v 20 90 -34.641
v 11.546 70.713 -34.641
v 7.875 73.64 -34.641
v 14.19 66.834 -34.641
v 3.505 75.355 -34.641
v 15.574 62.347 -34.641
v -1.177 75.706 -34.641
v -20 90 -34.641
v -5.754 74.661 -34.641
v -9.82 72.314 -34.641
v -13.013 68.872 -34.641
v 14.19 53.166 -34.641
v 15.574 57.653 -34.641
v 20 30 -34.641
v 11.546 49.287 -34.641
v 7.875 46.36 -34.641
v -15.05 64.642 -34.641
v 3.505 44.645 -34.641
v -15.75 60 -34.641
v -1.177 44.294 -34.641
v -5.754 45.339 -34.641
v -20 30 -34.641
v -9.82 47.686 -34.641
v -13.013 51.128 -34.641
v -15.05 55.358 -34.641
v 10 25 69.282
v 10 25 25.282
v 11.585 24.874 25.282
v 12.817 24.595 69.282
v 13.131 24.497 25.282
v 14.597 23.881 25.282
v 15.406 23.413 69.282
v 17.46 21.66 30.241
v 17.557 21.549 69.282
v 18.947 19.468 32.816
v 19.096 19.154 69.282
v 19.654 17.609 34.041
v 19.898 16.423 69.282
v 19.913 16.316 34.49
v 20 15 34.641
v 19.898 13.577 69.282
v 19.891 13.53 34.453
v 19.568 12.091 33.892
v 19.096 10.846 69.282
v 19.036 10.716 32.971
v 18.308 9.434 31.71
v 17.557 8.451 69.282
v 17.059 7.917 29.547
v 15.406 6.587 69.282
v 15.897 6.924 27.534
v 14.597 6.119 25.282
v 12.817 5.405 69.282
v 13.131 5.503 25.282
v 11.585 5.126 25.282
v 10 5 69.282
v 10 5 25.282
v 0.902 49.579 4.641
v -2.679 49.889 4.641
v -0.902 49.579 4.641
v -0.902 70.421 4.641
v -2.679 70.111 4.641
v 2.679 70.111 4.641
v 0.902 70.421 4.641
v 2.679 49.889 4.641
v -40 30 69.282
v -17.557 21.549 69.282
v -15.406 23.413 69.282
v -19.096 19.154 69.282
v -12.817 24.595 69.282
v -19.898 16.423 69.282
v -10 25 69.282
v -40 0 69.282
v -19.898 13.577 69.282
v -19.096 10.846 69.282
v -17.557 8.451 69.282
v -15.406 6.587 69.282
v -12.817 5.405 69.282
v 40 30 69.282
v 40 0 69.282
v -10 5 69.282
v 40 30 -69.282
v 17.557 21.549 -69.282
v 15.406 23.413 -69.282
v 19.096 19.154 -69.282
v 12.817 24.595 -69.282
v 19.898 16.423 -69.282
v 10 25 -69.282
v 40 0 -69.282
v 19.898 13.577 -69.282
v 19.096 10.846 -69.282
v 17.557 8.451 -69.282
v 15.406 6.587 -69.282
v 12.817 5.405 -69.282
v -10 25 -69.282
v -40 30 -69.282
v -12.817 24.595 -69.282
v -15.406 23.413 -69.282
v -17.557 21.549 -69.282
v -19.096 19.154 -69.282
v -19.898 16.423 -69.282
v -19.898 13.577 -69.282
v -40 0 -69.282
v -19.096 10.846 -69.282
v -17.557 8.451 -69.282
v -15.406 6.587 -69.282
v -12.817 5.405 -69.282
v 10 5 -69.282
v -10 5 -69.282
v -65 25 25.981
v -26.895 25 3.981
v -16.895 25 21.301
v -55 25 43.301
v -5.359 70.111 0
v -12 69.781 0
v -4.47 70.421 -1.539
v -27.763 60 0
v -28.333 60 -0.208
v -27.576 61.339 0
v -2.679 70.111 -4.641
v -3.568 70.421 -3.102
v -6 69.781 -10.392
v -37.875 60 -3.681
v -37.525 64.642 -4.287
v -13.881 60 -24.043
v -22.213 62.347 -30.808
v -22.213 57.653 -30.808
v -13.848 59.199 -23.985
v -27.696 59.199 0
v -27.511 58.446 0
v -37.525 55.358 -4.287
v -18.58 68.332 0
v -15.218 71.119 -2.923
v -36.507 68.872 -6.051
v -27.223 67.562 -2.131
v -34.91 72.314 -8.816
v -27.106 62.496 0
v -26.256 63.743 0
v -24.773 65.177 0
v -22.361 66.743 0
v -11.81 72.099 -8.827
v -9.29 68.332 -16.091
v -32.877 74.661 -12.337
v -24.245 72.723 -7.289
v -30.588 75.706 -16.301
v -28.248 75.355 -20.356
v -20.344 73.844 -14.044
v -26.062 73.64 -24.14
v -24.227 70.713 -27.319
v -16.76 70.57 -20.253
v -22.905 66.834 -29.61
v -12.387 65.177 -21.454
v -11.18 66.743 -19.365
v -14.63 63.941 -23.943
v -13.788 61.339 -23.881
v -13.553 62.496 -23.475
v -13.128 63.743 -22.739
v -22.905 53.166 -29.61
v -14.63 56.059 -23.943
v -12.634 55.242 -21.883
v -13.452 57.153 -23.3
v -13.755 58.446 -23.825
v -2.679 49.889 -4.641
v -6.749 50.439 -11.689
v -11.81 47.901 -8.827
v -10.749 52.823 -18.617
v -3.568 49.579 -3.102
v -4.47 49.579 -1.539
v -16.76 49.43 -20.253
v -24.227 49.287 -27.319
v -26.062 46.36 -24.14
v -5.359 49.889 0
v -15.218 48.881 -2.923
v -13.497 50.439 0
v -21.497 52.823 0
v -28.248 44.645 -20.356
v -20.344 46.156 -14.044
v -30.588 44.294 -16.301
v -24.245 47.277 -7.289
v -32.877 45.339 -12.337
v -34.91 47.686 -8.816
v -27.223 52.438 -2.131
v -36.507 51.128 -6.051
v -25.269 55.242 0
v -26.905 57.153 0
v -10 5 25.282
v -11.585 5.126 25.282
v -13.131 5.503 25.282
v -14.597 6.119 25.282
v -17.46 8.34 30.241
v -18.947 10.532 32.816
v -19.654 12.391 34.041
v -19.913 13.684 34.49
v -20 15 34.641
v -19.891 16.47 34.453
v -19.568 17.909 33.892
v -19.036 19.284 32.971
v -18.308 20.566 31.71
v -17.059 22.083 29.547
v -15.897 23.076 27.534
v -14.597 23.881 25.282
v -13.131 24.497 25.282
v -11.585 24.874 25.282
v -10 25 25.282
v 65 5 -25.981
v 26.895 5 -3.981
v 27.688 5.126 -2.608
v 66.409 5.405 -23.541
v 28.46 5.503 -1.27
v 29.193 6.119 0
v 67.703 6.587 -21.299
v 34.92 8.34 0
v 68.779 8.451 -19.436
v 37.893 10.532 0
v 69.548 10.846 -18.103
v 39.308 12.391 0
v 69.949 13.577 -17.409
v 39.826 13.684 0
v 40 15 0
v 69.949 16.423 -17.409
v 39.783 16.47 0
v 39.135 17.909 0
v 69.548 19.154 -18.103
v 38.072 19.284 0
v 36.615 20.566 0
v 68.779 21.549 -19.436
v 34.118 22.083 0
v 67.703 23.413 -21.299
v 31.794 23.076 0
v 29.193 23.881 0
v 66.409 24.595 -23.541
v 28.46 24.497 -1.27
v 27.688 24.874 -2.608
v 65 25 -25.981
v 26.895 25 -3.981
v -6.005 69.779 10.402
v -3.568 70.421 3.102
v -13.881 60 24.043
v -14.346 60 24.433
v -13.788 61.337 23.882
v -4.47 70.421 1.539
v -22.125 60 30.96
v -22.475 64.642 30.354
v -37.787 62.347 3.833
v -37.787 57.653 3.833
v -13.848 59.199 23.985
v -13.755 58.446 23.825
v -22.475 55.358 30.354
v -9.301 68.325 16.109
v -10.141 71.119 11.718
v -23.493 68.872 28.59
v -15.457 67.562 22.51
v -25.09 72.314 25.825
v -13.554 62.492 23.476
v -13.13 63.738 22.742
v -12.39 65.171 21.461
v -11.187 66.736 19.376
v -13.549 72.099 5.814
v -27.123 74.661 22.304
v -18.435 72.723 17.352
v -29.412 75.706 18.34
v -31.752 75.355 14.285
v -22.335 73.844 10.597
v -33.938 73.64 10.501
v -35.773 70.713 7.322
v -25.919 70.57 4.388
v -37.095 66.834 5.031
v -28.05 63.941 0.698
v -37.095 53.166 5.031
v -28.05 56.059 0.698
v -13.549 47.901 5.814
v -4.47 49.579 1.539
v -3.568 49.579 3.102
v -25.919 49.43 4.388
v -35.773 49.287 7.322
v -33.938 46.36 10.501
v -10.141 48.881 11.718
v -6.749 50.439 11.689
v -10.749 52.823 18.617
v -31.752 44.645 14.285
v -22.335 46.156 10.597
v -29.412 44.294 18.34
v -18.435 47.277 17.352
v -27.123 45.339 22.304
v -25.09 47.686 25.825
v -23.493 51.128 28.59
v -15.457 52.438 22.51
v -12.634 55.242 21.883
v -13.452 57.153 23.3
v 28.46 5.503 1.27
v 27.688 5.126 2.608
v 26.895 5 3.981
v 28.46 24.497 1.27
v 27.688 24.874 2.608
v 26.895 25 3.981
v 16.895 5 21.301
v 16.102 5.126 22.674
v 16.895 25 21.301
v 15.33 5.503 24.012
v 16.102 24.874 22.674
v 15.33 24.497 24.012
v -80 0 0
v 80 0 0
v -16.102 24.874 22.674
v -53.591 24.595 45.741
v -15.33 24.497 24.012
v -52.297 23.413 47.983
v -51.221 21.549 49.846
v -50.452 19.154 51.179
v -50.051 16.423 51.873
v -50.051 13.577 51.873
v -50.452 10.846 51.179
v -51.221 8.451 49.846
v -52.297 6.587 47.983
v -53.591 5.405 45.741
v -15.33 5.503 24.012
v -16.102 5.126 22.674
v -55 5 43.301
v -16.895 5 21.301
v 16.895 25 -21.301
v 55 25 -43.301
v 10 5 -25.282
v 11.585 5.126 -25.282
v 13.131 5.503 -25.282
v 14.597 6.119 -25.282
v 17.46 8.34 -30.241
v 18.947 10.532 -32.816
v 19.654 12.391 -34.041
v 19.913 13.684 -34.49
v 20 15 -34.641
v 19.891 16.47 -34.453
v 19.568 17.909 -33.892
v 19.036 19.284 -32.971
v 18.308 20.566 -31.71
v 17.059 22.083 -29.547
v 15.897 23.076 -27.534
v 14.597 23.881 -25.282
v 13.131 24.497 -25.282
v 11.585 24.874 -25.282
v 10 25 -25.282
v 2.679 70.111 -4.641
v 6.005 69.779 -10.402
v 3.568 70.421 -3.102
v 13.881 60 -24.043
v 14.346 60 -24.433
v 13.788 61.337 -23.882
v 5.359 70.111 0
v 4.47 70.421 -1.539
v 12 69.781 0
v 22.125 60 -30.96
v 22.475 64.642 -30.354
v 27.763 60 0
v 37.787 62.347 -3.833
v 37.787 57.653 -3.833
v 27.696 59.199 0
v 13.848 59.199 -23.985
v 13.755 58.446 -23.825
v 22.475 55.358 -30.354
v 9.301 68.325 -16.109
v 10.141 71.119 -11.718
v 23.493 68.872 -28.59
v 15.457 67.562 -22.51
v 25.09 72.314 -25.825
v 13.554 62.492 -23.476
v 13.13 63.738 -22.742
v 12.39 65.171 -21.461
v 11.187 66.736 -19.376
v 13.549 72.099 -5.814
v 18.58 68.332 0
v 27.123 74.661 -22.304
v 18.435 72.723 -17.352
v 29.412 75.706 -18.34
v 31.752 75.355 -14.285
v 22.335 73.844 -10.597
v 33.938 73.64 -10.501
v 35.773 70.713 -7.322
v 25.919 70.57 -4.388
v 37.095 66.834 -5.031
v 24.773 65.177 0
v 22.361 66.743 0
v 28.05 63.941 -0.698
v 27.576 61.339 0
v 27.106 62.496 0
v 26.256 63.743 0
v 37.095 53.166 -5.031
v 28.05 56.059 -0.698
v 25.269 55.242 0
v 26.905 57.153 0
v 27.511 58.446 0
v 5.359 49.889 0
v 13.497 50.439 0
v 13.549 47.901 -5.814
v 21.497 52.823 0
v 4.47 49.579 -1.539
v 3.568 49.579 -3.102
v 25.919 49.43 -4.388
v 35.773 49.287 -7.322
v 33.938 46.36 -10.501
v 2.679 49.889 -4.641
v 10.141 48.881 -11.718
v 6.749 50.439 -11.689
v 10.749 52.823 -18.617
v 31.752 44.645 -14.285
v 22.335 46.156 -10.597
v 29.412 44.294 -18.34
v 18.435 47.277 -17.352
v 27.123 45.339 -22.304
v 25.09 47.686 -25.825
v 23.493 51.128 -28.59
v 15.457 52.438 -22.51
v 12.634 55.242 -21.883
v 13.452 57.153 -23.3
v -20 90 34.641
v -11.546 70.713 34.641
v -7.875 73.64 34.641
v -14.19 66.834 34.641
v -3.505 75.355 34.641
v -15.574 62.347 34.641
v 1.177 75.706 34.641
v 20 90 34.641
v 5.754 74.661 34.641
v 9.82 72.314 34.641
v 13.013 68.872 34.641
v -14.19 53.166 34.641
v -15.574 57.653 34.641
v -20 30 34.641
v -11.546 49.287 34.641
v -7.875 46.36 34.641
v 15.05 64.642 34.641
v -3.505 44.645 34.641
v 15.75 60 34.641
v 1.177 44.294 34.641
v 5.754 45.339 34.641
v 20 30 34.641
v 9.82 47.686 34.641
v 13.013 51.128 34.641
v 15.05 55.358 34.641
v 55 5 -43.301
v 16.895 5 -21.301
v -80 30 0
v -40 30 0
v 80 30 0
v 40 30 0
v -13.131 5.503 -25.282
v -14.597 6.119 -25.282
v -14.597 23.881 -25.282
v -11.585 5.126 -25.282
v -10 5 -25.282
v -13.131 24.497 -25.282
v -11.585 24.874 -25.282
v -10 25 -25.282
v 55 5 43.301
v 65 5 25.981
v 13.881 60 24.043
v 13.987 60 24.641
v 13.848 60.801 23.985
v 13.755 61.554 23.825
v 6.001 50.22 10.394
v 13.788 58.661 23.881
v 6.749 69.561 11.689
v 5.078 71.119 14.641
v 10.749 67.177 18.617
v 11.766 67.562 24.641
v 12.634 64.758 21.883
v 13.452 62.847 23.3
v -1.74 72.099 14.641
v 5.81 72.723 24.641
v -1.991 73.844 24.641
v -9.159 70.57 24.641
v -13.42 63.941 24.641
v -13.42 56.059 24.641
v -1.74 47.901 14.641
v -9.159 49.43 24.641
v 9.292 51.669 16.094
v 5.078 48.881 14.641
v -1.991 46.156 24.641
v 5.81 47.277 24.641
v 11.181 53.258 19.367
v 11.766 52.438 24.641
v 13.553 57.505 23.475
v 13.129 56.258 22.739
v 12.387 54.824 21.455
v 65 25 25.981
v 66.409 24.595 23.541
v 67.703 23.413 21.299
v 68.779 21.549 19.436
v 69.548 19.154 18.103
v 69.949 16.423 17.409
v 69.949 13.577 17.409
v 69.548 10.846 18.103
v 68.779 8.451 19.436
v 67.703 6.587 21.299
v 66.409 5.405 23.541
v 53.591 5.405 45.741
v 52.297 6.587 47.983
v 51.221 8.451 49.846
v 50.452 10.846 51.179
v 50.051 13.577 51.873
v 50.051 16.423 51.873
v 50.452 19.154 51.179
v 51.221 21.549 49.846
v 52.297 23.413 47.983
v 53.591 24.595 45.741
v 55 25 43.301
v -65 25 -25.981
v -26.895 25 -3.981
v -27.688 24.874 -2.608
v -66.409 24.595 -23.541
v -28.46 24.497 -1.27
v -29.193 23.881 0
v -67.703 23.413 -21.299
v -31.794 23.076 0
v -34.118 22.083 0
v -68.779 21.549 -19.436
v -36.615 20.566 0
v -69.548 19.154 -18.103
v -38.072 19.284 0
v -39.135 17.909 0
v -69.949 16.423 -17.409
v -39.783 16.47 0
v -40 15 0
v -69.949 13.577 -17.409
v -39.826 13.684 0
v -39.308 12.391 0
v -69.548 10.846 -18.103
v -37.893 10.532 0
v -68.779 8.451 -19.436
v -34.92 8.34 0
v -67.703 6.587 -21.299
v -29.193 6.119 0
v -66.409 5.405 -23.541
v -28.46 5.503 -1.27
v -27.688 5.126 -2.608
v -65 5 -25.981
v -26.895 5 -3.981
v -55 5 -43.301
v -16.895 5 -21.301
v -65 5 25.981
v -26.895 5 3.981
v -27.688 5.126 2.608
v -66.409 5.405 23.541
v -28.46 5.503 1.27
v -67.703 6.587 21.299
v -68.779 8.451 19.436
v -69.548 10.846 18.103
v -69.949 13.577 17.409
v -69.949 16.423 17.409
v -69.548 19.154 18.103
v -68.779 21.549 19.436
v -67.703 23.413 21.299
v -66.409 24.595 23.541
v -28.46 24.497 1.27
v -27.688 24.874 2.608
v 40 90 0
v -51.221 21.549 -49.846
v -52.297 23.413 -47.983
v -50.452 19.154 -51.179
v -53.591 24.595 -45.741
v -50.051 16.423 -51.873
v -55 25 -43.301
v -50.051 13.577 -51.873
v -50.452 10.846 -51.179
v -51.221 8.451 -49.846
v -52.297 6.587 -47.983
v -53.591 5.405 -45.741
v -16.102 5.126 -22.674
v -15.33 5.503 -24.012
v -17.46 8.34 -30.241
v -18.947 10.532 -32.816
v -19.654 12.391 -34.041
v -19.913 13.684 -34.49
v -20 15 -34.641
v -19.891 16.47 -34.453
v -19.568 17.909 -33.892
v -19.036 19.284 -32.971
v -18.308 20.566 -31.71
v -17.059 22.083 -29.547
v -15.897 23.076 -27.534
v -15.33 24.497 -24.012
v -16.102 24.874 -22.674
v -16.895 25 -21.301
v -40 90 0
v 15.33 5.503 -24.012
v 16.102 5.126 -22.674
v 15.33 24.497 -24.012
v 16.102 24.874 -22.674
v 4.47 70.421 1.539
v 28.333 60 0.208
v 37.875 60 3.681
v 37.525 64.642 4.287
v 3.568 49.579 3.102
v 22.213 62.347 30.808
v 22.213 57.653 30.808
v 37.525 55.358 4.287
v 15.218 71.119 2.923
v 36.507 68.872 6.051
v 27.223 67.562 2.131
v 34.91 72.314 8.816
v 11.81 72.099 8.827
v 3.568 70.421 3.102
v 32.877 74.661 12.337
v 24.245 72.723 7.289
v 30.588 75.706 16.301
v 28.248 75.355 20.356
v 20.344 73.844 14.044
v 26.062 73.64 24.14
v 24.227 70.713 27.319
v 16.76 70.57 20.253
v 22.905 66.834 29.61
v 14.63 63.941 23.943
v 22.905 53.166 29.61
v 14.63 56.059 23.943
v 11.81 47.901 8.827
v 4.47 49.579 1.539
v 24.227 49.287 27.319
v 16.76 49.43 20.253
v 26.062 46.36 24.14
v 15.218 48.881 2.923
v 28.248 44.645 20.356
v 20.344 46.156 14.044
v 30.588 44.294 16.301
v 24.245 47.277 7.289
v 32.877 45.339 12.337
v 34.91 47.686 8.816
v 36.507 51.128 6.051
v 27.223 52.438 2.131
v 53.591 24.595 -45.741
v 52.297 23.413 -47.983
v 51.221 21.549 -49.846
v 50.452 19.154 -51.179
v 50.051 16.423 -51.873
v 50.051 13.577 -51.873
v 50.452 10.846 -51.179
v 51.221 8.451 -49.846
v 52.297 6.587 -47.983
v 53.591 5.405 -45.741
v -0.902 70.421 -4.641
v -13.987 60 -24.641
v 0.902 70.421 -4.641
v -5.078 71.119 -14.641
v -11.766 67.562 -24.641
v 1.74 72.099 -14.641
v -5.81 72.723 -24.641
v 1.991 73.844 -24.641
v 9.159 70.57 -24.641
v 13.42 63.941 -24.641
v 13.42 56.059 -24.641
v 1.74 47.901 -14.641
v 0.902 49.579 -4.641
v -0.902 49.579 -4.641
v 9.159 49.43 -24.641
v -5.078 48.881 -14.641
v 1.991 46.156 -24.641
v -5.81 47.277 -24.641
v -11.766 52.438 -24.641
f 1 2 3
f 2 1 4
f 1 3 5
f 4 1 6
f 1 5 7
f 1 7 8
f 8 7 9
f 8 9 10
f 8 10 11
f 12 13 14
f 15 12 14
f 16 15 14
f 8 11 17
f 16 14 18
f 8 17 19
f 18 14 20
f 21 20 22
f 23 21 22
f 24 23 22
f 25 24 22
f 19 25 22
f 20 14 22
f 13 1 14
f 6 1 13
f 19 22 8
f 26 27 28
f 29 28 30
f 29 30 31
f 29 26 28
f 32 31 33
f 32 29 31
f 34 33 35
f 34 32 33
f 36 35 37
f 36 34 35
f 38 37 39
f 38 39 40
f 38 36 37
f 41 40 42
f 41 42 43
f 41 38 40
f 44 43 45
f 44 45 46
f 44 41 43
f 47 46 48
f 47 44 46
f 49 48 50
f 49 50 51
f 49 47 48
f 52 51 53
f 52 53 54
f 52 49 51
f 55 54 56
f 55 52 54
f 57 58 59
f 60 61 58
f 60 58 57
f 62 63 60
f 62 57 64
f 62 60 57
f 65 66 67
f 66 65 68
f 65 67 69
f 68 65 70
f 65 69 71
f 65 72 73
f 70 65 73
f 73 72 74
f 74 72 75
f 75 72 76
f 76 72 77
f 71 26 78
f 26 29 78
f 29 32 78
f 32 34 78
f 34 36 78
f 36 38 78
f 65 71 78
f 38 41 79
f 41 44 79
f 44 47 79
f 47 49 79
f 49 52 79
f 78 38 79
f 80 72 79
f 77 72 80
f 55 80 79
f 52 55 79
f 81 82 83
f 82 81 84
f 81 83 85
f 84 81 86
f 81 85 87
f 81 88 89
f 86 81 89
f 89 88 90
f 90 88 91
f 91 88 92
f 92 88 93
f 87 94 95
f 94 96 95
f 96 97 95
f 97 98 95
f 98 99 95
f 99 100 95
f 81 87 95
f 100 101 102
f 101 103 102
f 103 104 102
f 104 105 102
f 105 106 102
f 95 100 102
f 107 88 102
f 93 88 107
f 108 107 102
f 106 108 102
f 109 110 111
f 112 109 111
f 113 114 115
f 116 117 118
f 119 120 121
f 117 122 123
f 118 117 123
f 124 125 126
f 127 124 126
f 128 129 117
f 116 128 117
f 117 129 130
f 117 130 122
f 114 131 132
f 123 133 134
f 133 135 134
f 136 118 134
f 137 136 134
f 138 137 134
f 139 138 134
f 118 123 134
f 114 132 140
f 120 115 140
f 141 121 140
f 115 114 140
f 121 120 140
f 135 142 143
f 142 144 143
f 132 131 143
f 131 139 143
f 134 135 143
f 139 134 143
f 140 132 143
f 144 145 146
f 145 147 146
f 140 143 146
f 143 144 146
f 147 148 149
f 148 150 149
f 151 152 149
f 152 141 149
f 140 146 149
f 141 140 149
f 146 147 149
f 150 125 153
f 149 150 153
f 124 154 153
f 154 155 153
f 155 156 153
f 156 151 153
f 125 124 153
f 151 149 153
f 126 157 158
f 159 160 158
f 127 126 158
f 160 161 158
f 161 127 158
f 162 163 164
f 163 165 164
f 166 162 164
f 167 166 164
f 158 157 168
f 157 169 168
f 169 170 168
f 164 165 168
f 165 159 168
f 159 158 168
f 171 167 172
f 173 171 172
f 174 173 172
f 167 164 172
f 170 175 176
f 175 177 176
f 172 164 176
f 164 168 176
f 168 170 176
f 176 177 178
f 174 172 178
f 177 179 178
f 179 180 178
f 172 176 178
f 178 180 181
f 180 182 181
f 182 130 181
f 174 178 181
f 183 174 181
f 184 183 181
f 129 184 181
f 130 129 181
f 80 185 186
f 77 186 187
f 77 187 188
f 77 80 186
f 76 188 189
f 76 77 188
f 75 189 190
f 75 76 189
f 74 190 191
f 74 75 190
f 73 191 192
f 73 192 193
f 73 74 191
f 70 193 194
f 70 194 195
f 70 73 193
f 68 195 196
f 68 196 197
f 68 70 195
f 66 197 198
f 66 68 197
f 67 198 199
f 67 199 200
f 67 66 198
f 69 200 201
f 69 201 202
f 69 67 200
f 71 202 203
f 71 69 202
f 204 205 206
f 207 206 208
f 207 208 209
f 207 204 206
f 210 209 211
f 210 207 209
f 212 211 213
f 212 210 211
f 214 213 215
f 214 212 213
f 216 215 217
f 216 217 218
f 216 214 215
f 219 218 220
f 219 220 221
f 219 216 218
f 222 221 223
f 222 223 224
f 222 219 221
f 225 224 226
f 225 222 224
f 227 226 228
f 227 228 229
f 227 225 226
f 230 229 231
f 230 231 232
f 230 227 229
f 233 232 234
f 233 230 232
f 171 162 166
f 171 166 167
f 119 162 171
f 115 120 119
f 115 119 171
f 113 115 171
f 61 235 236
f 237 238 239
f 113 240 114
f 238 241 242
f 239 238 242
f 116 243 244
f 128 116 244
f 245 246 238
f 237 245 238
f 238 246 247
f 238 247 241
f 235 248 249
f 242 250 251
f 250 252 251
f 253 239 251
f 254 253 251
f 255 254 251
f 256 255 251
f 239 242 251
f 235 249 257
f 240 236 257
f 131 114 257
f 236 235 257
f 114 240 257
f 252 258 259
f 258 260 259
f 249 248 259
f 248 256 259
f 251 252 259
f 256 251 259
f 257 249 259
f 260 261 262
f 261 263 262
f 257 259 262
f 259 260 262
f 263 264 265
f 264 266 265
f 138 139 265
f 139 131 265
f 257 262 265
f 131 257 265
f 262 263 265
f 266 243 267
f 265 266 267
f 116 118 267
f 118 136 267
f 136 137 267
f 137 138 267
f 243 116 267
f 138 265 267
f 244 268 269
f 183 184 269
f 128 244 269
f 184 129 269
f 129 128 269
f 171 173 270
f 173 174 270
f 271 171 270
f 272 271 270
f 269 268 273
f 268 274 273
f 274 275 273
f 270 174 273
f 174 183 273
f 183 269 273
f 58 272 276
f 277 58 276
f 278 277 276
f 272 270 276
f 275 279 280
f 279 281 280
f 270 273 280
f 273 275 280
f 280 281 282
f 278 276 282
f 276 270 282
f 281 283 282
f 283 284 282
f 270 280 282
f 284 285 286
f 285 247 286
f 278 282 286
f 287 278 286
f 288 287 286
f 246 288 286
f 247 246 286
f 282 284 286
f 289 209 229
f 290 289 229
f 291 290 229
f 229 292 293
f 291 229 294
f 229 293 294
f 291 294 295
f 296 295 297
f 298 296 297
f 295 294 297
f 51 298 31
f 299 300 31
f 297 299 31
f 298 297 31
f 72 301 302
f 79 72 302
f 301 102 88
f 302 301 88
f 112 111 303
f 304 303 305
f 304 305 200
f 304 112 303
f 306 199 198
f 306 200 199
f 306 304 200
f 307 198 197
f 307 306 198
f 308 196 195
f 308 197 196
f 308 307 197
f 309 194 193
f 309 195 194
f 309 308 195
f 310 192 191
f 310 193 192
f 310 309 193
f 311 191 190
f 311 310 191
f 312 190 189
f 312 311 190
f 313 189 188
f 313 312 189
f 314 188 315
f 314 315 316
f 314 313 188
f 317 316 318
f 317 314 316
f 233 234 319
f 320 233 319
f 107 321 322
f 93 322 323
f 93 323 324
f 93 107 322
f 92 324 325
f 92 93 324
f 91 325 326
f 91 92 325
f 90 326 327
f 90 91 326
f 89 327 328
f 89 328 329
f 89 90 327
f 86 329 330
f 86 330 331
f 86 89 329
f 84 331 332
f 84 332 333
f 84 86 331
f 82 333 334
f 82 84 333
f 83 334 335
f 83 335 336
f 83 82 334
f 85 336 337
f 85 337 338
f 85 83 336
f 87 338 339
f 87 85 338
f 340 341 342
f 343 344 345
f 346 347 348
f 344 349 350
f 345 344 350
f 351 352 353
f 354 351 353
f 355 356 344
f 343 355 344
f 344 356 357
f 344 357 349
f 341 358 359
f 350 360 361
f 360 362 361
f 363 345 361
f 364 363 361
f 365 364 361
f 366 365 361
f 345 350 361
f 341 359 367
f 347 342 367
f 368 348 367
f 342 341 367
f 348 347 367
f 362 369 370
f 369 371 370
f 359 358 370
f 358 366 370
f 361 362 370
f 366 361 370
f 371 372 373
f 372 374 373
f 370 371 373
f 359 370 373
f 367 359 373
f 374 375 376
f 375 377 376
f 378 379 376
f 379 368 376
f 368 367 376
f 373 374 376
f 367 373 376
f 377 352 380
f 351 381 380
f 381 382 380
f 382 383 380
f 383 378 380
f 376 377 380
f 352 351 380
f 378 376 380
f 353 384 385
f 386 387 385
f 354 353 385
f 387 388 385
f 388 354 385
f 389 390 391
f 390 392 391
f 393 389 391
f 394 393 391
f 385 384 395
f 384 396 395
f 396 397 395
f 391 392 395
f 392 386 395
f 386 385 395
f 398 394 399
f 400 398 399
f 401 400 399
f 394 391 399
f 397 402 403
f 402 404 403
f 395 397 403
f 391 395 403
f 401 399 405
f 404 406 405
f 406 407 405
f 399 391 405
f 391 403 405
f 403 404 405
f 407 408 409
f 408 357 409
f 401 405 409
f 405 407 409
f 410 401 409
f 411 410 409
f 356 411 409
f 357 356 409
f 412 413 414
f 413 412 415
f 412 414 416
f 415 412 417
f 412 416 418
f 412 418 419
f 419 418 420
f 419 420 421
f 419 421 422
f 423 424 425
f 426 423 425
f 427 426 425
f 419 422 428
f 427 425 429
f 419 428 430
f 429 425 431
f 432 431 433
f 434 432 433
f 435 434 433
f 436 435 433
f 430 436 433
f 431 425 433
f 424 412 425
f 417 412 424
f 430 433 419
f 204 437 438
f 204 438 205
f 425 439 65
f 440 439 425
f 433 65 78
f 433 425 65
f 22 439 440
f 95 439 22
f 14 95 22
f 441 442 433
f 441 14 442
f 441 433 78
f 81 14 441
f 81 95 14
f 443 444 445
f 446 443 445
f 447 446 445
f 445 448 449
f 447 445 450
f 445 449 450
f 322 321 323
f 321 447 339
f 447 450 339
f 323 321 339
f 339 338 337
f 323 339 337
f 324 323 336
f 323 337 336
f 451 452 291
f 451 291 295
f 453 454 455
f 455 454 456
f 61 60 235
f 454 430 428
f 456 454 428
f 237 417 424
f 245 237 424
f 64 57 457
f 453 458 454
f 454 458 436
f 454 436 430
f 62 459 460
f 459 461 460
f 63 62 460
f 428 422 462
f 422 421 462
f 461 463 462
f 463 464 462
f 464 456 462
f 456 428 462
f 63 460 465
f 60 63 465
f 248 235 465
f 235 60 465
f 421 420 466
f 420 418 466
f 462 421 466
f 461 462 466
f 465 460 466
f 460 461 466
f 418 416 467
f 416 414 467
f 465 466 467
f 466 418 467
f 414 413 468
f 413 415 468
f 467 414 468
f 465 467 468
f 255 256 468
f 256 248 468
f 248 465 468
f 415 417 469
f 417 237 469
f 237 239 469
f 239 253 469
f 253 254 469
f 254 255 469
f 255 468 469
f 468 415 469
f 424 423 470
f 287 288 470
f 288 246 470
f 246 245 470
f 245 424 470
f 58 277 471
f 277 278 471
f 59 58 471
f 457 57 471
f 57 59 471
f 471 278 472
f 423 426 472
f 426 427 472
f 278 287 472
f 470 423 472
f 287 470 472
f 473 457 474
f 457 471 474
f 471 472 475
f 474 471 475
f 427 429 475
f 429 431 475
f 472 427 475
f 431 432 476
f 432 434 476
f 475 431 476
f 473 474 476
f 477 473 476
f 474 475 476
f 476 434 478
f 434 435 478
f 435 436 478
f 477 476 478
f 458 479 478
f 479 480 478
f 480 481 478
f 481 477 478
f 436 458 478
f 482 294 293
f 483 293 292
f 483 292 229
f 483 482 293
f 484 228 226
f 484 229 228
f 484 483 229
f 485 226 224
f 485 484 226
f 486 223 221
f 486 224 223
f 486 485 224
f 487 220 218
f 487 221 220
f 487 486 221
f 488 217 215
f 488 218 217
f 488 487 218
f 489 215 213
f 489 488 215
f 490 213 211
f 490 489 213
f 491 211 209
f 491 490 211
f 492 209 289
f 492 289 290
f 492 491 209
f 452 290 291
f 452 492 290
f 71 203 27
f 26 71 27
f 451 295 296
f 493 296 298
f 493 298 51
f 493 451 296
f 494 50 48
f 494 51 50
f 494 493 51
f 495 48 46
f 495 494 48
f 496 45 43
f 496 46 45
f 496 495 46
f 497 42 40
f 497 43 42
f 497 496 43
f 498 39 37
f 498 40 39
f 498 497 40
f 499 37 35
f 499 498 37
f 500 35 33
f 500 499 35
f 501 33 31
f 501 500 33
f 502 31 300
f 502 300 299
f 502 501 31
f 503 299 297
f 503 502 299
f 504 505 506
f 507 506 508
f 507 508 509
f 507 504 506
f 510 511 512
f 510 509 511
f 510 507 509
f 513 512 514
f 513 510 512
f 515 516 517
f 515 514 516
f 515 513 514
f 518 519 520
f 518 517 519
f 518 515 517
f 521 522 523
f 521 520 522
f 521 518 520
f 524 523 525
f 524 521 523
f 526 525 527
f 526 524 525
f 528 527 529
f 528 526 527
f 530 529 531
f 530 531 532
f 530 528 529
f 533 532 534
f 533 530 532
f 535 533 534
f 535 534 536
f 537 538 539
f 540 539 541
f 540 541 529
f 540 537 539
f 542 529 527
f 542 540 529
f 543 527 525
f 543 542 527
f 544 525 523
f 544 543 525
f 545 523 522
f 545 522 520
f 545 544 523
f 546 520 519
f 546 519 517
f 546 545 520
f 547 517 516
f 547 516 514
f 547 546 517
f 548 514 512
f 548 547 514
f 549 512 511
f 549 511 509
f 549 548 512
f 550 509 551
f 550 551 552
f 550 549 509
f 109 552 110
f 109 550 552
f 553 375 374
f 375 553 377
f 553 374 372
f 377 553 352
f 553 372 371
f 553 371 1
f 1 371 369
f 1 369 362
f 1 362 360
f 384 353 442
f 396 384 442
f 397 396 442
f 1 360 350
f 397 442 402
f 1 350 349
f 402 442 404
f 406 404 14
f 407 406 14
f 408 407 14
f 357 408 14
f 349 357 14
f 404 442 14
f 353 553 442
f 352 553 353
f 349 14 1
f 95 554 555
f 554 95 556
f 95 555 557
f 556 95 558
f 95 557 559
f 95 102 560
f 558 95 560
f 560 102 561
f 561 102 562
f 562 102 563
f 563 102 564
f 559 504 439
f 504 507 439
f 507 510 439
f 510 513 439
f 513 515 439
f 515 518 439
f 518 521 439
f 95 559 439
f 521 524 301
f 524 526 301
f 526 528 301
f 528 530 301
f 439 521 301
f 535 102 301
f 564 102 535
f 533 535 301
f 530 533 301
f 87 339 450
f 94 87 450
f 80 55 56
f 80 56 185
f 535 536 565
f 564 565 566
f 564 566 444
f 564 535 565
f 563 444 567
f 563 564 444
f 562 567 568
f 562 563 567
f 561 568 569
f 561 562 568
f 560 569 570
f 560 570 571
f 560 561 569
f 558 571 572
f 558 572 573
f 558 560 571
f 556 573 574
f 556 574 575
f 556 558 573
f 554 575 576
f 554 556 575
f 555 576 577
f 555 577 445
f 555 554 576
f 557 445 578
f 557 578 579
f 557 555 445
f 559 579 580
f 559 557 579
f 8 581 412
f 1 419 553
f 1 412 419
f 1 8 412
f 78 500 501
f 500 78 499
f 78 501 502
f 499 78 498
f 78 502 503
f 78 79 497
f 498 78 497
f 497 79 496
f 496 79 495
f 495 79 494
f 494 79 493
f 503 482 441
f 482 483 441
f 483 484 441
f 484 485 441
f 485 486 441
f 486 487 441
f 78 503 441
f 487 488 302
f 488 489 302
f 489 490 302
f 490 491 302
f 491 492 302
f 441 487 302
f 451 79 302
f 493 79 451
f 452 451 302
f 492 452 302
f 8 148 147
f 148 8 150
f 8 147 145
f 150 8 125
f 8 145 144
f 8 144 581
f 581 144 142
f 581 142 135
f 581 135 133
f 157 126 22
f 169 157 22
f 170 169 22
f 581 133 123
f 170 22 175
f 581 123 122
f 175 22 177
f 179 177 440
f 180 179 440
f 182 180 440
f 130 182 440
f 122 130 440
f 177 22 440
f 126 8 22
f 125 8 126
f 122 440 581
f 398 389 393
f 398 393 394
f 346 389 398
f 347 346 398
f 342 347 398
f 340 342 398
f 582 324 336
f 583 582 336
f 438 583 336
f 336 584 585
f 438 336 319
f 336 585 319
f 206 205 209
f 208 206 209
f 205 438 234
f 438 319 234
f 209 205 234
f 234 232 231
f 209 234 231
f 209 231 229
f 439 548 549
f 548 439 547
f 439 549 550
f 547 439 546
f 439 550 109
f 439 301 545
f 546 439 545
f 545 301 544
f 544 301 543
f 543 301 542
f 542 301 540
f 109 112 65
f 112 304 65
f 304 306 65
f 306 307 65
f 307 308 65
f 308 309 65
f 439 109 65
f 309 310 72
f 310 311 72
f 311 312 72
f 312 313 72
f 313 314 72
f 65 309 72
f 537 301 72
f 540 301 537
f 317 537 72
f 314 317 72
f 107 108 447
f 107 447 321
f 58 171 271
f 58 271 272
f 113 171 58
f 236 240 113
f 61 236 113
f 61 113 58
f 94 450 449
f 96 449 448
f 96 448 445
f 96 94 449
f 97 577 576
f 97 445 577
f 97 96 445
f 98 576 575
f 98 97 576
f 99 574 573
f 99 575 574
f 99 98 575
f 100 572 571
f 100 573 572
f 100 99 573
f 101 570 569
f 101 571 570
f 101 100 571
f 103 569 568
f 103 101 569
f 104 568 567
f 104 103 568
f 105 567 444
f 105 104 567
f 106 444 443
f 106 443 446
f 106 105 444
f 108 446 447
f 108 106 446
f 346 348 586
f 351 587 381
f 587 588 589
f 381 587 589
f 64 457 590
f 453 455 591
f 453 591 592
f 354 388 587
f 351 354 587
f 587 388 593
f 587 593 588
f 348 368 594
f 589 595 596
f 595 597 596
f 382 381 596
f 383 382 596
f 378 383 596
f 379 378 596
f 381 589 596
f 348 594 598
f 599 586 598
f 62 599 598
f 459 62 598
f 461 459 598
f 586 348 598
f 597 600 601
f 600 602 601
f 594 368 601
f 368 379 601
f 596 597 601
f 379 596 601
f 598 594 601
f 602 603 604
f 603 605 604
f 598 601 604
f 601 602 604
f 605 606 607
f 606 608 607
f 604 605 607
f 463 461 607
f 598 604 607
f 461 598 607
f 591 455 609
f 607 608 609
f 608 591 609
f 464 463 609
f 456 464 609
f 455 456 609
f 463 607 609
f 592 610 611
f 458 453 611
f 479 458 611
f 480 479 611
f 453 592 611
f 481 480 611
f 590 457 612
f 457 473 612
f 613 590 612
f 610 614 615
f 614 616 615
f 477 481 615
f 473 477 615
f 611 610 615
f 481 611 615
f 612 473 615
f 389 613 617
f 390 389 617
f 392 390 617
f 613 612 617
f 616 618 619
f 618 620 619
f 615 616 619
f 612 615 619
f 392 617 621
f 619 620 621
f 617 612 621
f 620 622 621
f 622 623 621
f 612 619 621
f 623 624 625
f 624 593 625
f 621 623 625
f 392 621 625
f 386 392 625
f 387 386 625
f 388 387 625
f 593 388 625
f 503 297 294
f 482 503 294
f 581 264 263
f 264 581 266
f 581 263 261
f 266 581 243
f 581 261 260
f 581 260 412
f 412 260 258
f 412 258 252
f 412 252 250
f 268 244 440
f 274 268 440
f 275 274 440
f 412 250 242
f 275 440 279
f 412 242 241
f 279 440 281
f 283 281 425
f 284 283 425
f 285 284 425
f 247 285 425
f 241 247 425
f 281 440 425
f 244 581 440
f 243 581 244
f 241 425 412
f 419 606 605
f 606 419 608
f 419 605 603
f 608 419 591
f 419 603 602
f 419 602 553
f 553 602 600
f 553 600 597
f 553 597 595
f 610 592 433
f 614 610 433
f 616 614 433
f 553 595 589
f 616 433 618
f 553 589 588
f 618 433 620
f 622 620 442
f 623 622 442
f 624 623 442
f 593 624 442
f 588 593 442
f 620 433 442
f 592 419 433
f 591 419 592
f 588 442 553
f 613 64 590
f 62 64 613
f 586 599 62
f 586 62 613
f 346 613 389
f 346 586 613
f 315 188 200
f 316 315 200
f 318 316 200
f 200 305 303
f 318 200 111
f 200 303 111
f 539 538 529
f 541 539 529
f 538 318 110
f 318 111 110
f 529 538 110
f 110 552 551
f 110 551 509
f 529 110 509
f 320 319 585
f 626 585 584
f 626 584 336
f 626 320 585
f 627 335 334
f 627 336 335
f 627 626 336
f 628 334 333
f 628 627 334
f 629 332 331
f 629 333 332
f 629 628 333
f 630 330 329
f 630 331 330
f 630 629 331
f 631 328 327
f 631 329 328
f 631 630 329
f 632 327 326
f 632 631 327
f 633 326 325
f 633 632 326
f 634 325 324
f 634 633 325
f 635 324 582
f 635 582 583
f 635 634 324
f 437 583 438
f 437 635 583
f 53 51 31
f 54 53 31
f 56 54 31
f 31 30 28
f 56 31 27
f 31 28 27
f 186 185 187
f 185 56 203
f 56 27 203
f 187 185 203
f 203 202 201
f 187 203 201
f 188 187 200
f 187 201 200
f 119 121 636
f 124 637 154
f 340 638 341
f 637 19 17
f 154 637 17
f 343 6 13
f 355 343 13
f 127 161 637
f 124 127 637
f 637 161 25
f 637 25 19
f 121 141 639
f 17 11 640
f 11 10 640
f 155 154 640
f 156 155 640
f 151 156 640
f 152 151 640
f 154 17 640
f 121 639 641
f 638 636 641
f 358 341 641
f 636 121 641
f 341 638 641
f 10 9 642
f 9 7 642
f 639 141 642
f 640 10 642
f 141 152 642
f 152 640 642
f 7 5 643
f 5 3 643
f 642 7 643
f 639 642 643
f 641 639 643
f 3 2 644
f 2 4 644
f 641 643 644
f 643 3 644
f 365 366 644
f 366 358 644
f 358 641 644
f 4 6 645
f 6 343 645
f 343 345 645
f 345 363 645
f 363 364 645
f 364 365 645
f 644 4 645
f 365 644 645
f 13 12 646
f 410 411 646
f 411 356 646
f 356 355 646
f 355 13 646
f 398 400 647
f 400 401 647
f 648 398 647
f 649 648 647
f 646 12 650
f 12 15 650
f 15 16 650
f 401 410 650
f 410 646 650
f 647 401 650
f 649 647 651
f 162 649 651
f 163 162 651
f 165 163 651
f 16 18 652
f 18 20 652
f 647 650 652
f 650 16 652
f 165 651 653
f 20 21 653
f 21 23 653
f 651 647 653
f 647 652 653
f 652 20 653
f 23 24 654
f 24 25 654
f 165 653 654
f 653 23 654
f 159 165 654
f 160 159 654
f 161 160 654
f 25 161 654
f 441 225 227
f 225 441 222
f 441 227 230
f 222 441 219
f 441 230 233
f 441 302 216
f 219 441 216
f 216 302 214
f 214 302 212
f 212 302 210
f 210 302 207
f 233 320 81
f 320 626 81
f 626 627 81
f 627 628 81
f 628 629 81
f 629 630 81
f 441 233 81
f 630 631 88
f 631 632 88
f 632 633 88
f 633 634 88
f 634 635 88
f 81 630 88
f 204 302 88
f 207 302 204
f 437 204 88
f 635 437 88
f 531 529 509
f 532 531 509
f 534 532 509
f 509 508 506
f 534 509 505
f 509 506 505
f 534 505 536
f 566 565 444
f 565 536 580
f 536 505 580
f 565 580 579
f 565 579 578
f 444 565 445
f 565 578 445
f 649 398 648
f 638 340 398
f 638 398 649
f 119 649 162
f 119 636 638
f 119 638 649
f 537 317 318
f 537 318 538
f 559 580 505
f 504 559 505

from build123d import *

# Parameters (mm, degrees)
BOSS_EXTRUDE1_DEPTH         = 30
BOSS_EXTRUDE3_DEPTH         = 60
SKETCH8_R                   = 15.75
CUT_EXTRUDE3_DEPTH          = 30
CUT_EXTRUDE3_DRAFT          = -10
CIRPATTERN4_COPY_1_SKETCH_R = 15.75
CIRPATTERN4_COPY_1_DEPTH    = 30
CIRPATTERN4_COPY_1_DRAFT    = -10
CIRPATTERN4_COPY_2_SKETCH_R = 15.75
CIRPATTERN4_COPY_2_DEPTH    = 30
CIRPATTERN4_COPY_2_DRAFT    = -10
CIRPATTERN4_COPY_3_SKETCH_R = 15.75
CIRPATTERN4_COPY_3_DEPTH    = 30
CIRPATTERN4_COPY_3_DRAFT    = -10
CIRPATTERN4_COPY_4_SKETCH_R = 15.75
CIRPATTERN4_COPY_4_DEPTH    = 30
CIRPATTERN4_COPY_4_DRAFT    = -10
CIRPATTERN4_COPY_5_SKETCH_R = 15.75
CIRPATTERN4_COPY_5_DEPTH    = 30
CIRPATTERN4_COPY_5_DRAFT    = -10
CUT_EXTRUDE4_DEPTH          = 44
CIRPATTERN6_COUNT           = 6


with BuildPart() as part:
    # Sketch1 → Boss-Extrude1 (new body)
    with BuildSketch(Plane(origin=(0, 0, 0), x_dir=(1, 0, 0), z_dir=(0, 1, 0))):
        Polygon((40, -69.282032303), (80, 0), (40, 69.282032303), (-40, 69.282032303), (-80, 0), (-40, -69.282032303), align=None)
    extrude(amount=BOSS_EXTRUDE1_DEPTH)

    # Sketch2 → Boss-Extrude3 (add)
    with BuildSketch(Plane(origin=(0, 30, 0), x_dir=(1, 0, 0), z_dir=(0, 1, 0))):
        Polygon((20, -34.641016151), (40, 0), (20, 34.641016151), (-20, 34.641016151), (-40, 0), (-20, -34.641016151), align=None)
    extrude(amount=BOSS_EXTRUDE3_DEPTH)


with BuildPart() as cut_extrude3_tool:
    # Sketch8 → Cut-Extrude3 (with draft: the straight prism first)
    with BuildSketch(Plane(origin=(30, 0, 17.320508076), x_dir=(0.5000000000000001, 0, -0.8660254037844386), z_dir=(0.8660254037844386, 0, 0.5000000000000001))):
        with Locations((0, 60)):
            Circle(SKETCH8_R)
    extrude(amount=-CUT_EXTRUDE3_DEPTH)
    # Cut-Extrude3: the draft: its side faces are tilted about the plane it starts from
    cut_extrude3_sides = [cut_extrude3_tool.faces().sort_by_distance(p)[0] for p in [
        (9.134618943, 60, 23.460408185),
    ]]
    draft(cut_extrude3_sides, Plane(origin=(30, 0, 17.320508076), x_dir=(0.5000000000000001, 0, -0.8660254037844386), z_dir=(0.8660254037844386, 0, 0.5000000000000001)), CUT_EXTRUDE3_DRAFT)


with BuildPart() as part_1:
    add(part.part)

    # Cut-Extrude3: cut by cut_extrude3_tool
    add(cut_extrude3_tool.part, mode=Mode.SUBTRACT)


with BuildPart() as cirpattern4_copy_1_tool:
    # CirPattern4 copy 1 sketch → CirPattern4 copy 1 (with draft: the straight prism first)
    with BuildSketch(Plane(origin=(30, 0, -17.320508076), x_dir=(-0.4999999999999998, 0, -0.8660254037844388), z_dir=(0.8660254037844388, 0, -0.4999999999999998))):
        with Locations((0, 60)):
            Circle(CIRPATTERN4_COPY_1_SKETCH_R)
    extrude(amount=-CIRPATTERN4_COPY_1_DEPTH)
    # CirPattern4 copy 1: the draft: its side faces are tilted about the plane it starts from
    cirpattern4_copy_1_sides = [cirpattern4_copy_1_tool.faces().sort_by_distance(p)[0] for p in [
        (24.884618943, 60, 3.819392034),
    ]]
    draft(cirpattern4_copy_1_sides, Plane(origin=(30, 0, -17.320508076), x_dir=(-0.4999999999999998, 0, -0.8660254037844388), z_dir=(0.8660254037844388, 0, -0.4999999999999998)), CIRPATTERN4_COPY_1_DRAFT)


with BuildPart() as part_2:
    add(part_1.part)

    # CirPattern4 copy 1: cut by cirpattern4_copy_1_tool
    add(cirpattern4_copy_1_tool.part, mode=Mode.SUBTRACT)


with BuildPart() as cirpattern4_copy_2_tool:
    # CirPattern4 copy 2 sketch → CirPattern4 copy 2 (with draft: the straight prism first)
    with BuildSketch(Plane(origin=(0, 0, -34.641016151), x_dir=(-1, 0, 0), z_dir=(0, 0, -1))):
        with Locations((0, 60)):
            Circle(CIRPATTERN4_COPY_2_SKETCH_R)
    extrude(amount=-CIRPATTERN4_COPY_2_DEPTH)
    # CirPattern4 copy 2: the draft: its side faces are tilted about the plane it starts from
    cirpattern4_copy_2_sides = [cirpattern4_copy_2_tool.faces().sort_by_distance(p)[0] for p in [
        (15.75, 60, -19.641016151),
    ]]
    draft(cirpattern4_copy_2_sides, Plane(origin=(0, 0, -34.641016151), x_dir=(-1, 0, 0), z_dir=(0, 0, -1)), CIRPATTERN4_COPY_2_DRAFT)


with BuildPart() as part_3:
    add(part_2.part)

    # CirPattern4 copy 2: cut by cirpattern4_copy_2_tool
    add(cirpattern4_copy_2_tool.part, mode=Mode.SUBTRACT)


with BuildPart() as cirpattern4_copy_3_tool:
    # CirPattern4 copy 3 sketch → CirPattern4 copy 3 (with draft: the straight prism first)
    with BuildSketch(Plane(origin=(-30, 0, -17.320508076), x_dir=(-0.5000000000000002, 0, 0.8660254037844385), z_dir=(-0.8660254037844385, 0, -0.5000000000000002))):
        with Locations((0, 60)):
            Circle(CIRPATTERN4_COPY_3_SKETCH_R)
    extrude(amount=-CIRPATTERN4_COPY_3_DEPTH)
    # CirPattern4 copy 3: the draft: its side faces are tilted about the plane it starts from
    cirpattern4_copy_3_sides = [cirpattern4_copy_3_tool.faces().sort_by_distance(p)[0] for p in [
        (-9.134618943, 60, -23.460408185),
    ]]
    draft(cirpattern4_copy_3_sides, Plane(origin=(-30, 0, -17.320508076), x_dir=(-0.5000000000000002, 0, 0.8660254037844385), z_dir=(-0.8660254037844385, 0, -0.5000000000000002)), CIRPATTERN4_COPY_3_DRAFT)


with BuildPart() as part_4:
    add(part_3.part)

    # CirPattern4 copy 3: cut by cirpattern4_copy_3_tool
    add(cirpattern4_copy_3_tool.part, mode=Mode.SUBTRACT)


with BuildPart() as cirpattern4_copy_4_tool:
    # CirPattern4 copy 4 sketch → CirPattern4 copy 4 (with draft: the straight prism first)
    with BuildSketch(Plane(origin=(-30, 0, 17.320508076), x_dir=(0.4999999999999994, 0, 0.866025403784439), z_dir=(-0.866025403784439, 0, 0.4999999999999994))):
        with Locations((0, 60)):
            Circle(CIRPATTERN4_COPY_4_SKETCH_R)
    extrude(amount=-CIRPATTERN4_COPY_4_DEPTH)
    # CirPattern4 copy 4: the draft: its side faces are tilted about the plane it starts from
    cirpattern4_copy_4_sides = [cirpattern4_copy_4_tool.faces().sort_by_distance(p)[0] for p in [
        (-24.884618943, 60, -3.819392034),
    ]]
    draft(cirpattern4_copy_4_sides, Plane(origin=(-30, 0, 17.320508076), x_dir=(0.4999999999999994, 0, 0.866025403784439), z_dir=(-0.866025403784439, 0, 0.4999999999999994)), CIRPATTERN4_COPY_4_DRAFT)


with BuildPart() as part_5:
    add(part_4.part)

    # CirPattern4 copy 4: cut by cirpattern4_copy_4_tool
    add(cirpattern4_copy_4_tool.part, mode=Mode.SUBTRACT)


with BuildPart() as cirpattern4_copy_5_tool:
    # CirPattern4 copy 5 sketch → CirPattern4 copy 5 (with draft: the straight prism first)
    with BuildSketch(Plane.XY.offset(34.641016151)):
        with Locations((0, 60)):
            Circle(CIRPATTERN4_COPY_5_SKETCH_R)
    extrude(amount=-CIRPATTERN4_COPY_5_DEPTH)
    # CirPattern4 copy 5: the draft: its side faces are tilted about the plane it starts from
    cirpattern4_copy_5_sides = [cirpattern4_copy_5_tool.faces().sort_by_distance(p)[0] for p in [
        (-15.75, 60, 19.641016151),
    ]]
    draft(cirpattern4_copy_5_sides, Plane.XY.offset(34.641016151), CIRPATTERN4_COPY_5_DRAFT)


with BuildPart() as part_6:
    add(part_5.part)

    # CirPattern4 copy 5: cut by cirpattern4_copy_5_tool
    add(cirpattern4_copy_5_tool.part, mode=Mode.SUBTRACT)

    # Sketch3 → Cut-Extrude4 (cut)
    with BuildSketch(Plane(origin=(60, 0, 34.641016151), x_dir=(0.5000000000000001, 0, -0.8660254037844386), z_dir=(0.8660254037844386, 0, 0.5000000000000001))):
        with BuildLine():
            Line((-10, 25), (10, 25))
            ThreePointArc((10, 25), (20, 15), (10, 5))
            Line((10, 5), (-10, 5))
            ThreePointArc((-10, 5), (-20, 15), (-10, 25))
        make_face()
    cut_extrude4 = extrude(amount=-CUT_EXTRUDE4_DEPTH, mode=Mode.SUBTRACT)

    # CirPattern6: Cut-Extrude4 ×6 about axis
    cirpattern6_axis = Axis((0, -4.5, 0), (0, 1, 0))
    for i in range(1, CIRPATTERN6_COUNT):
        add(cut_extrude4.rotate(cirpattern6_axis, i * 360 / CIRPATTERN6_COUNT), mode=Mode.SUBTRACT)


solid = part_6.part
